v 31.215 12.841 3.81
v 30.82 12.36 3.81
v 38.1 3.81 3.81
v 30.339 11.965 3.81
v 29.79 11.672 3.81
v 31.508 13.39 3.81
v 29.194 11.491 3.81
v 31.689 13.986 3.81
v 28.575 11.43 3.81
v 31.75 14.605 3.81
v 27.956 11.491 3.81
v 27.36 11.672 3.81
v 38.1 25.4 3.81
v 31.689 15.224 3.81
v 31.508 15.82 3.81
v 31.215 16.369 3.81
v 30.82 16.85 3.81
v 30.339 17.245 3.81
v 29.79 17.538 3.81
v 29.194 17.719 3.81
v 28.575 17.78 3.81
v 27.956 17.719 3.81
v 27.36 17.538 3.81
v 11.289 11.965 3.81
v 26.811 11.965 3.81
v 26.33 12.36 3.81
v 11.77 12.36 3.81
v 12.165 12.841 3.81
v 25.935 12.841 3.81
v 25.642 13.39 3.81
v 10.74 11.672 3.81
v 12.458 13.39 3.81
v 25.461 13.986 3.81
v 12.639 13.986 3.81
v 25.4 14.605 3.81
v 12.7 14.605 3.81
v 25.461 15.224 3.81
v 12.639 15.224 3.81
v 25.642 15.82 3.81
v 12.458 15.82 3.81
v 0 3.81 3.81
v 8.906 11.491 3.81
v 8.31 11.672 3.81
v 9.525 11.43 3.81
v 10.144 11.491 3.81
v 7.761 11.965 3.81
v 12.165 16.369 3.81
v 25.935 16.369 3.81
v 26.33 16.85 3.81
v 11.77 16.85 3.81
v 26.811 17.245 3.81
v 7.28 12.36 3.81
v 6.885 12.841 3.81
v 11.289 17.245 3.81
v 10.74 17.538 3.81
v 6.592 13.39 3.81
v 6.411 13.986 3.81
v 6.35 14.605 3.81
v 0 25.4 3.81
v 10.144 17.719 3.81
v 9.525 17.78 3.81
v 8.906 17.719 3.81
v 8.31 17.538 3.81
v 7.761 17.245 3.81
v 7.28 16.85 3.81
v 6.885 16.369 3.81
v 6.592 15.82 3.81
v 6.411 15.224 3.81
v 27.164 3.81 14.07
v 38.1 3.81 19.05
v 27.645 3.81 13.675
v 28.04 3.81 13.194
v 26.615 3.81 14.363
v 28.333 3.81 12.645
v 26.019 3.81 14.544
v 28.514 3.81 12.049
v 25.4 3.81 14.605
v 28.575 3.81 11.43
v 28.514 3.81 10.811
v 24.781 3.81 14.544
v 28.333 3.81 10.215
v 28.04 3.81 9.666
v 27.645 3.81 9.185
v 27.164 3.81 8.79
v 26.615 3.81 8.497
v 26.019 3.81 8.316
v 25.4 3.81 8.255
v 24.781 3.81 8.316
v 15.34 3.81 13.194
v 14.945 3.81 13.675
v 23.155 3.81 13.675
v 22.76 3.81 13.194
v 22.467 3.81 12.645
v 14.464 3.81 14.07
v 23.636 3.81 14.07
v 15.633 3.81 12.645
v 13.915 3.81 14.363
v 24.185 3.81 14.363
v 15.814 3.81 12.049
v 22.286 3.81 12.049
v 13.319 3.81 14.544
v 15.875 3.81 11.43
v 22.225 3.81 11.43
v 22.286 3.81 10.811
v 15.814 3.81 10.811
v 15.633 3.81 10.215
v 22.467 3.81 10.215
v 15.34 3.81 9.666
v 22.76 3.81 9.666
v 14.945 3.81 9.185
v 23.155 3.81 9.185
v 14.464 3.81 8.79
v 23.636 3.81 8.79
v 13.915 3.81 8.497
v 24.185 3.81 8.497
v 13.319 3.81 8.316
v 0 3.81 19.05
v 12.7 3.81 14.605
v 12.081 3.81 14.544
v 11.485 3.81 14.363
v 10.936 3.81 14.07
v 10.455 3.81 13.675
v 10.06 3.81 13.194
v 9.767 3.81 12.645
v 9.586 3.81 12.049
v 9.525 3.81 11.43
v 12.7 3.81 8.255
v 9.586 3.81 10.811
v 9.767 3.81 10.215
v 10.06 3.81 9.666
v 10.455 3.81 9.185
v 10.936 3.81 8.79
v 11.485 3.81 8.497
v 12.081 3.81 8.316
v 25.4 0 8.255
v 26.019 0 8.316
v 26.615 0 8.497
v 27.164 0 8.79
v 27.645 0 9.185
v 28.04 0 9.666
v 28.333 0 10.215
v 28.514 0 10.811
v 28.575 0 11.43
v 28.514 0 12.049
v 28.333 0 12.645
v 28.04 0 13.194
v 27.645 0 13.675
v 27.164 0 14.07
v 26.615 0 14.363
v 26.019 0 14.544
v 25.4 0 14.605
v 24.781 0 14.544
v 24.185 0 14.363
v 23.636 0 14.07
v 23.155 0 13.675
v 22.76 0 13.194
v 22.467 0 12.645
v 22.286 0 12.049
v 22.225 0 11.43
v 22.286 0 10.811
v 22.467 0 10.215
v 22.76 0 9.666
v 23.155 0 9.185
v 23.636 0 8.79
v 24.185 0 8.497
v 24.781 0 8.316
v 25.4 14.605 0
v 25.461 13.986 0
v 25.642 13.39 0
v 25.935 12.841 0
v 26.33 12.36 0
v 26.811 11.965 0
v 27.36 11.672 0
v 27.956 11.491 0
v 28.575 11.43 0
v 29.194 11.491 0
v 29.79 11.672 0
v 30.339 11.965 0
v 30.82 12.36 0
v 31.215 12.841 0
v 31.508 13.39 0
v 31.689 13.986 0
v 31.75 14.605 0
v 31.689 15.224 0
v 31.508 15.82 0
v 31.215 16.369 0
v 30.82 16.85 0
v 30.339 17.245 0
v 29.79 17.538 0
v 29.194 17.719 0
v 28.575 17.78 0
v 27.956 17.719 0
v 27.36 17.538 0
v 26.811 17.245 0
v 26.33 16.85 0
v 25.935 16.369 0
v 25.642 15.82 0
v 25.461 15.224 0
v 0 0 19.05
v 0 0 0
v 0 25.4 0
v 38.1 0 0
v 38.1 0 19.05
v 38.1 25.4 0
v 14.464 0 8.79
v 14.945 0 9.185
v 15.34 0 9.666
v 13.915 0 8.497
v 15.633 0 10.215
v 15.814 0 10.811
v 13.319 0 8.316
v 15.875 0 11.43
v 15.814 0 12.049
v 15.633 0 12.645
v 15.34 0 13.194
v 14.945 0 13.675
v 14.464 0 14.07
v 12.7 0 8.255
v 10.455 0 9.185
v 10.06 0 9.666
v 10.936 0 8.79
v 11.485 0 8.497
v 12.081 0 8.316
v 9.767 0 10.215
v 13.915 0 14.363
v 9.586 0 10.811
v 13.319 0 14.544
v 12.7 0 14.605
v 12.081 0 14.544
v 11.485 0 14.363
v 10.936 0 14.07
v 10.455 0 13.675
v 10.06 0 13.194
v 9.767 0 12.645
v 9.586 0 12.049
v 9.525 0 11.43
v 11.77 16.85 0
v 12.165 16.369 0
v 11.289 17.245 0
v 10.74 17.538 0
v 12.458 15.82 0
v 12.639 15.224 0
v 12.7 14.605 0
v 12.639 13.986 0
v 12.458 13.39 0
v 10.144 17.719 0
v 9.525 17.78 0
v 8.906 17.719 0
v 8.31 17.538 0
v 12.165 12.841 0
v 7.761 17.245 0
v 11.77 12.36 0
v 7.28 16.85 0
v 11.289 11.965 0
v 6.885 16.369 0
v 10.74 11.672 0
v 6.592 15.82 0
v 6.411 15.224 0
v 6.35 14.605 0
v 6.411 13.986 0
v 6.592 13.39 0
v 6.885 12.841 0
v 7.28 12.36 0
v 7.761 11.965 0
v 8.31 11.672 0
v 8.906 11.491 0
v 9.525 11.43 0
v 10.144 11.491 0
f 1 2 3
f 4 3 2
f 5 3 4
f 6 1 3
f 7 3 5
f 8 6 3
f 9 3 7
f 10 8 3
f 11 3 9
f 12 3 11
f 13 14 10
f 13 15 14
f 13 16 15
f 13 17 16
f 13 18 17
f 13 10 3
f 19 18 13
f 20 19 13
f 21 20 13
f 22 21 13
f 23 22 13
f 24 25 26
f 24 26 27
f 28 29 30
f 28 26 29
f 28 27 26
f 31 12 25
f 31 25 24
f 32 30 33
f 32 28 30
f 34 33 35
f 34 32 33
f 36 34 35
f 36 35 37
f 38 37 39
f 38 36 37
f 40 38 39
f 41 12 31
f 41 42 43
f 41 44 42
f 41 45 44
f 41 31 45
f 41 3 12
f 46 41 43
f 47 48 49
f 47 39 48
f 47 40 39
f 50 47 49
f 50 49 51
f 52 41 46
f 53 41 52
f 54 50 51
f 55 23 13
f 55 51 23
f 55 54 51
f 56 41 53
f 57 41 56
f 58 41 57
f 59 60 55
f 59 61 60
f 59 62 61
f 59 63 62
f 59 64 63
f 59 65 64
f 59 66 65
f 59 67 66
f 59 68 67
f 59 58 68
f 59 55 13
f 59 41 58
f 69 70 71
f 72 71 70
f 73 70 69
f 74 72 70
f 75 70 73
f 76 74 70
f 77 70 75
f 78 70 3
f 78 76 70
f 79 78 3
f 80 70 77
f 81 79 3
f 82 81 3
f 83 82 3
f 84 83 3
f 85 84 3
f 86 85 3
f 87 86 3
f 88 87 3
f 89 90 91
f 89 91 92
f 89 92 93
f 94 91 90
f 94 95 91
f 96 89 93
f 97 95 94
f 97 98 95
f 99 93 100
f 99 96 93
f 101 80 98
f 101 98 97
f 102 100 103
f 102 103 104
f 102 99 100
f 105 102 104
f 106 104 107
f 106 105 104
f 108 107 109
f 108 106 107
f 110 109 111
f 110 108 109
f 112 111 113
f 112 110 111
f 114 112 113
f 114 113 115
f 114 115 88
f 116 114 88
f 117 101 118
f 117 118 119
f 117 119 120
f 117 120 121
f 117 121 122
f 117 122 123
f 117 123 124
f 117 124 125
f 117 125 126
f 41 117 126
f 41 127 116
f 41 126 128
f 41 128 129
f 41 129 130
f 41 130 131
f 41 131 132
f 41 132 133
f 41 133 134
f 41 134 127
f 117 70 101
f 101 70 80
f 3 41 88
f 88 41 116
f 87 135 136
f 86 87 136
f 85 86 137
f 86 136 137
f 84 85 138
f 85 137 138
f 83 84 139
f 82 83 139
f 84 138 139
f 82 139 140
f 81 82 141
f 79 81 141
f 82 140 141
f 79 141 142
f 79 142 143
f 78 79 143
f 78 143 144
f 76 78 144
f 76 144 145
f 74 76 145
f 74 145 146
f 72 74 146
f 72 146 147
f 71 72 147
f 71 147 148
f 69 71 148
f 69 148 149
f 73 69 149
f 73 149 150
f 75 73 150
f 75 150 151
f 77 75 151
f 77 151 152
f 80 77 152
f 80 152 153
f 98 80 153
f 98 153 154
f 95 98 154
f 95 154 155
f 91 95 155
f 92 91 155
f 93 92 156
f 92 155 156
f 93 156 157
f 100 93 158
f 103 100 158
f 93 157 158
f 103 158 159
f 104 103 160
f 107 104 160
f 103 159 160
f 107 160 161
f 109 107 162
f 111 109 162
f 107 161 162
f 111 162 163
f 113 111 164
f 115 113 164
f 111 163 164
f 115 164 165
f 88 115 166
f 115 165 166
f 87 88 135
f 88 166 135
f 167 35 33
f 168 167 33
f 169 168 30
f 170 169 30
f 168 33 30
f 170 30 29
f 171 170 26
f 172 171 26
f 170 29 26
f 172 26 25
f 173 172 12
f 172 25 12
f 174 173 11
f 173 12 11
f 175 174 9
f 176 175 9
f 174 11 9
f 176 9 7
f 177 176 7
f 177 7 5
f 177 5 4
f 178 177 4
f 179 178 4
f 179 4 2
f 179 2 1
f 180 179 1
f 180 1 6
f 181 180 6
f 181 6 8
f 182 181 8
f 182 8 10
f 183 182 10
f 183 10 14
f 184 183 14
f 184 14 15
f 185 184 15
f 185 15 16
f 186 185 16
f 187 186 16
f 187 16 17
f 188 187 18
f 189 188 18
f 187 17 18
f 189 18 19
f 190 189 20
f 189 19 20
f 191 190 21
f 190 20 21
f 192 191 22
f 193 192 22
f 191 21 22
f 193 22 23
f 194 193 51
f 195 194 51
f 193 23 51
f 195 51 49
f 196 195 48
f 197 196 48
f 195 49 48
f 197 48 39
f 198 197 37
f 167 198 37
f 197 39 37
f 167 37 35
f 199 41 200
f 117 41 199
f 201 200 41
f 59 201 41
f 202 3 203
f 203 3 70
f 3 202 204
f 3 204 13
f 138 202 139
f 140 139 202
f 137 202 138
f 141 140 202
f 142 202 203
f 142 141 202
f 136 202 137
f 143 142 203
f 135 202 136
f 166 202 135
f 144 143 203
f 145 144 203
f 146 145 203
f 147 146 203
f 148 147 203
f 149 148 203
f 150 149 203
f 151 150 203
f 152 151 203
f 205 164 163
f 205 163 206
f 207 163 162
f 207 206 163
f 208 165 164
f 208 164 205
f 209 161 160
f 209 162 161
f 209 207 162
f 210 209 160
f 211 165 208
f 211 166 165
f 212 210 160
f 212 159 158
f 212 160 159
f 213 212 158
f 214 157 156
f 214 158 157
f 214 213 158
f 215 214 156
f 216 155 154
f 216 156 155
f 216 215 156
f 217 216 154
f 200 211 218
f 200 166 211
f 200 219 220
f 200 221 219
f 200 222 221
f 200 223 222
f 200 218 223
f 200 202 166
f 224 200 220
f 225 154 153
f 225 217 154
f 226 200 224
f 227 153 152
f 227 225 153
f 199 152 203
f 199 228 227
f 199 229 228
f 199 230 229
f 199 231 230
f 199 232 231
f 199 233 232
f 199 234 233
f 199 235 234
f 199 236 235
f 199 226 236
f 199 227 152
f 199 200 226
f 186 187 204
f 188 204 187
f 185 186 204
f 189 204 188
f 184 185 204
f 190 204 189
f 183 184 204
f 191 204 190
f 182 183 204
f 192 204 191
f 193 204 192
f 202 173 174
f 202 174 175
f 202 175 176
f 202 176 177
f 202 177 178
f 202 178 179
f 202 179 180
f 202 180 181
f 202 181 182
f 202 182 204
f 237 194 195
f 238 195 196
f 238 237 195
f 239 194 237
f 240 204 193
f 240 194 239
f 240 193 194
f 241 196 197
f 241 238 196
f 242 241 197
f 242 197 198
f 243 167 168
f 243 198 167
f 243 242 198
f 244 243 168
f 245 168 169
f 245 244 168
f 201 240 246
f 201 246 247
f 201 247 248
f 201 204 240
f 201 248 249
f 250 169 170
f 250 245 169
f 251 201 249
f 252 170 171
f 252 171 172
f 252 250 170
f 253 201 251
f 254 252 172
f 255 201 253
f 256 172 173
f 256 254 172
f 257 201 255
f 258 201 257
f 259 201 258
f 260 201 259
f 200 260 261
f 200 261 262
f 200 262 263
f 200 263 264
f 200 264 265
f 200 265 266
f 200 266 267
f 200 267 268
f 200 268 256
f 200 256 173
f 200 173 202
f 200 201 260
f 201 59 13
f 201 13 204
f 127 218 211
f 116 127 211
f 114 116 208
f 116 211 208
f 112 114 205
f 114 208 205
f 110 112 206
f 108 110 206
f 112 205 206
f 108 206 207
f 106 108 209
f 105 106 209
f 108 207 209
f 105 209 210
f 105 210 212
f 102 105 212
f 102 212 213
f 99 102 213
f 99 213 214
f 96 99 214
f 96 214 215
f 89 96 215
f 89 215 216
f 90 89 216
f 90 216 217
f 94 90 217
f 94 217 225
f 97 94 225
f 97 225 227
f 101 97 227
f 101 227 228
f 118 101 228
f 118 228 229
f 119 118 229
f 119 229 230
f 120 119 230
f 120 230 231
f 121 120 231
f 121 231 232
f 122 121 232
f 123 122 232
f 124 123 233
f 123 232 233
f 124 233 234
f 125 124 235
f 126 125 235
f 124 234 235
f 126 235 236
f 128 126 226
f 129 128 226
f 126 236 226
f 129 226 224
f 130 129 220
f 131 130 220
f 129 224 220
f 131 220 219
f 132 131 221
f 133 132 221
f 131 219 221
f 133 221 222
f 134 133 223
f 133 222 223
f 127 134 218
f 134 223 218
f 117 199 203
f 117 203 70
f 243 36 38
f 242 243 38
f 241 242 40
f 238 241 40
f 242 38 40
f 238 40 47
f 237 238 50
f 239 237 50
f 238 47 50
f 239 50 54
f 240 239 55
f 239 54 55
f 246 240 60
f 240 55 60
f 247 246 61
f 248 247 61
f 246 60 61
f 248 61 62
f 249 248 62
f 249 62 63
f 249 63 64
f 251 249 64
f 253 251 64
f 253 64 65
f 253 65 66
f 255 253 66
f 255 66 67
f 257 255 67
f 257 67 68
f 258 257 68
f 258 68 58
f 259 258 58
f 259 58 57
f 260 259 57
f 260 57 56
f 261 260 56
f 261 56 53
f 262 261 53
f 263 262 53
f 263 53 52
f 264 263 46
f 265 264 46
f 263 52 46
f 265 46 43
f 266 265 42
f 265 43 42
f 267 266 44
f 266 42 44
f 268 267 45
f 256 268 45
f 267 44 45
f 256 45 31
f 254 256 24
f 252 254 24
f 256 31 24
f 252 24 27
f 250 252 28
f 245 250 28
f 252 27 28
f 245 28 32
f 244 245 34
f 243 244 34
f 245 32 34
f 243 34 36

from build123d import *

# Parameters (mm, degrees)
BOSS_EXTRUDE1_DEPTH = 38.1
SKETCH3_R           = 3.175
CUT_EXTRUDE1_DEPTH  = 49.26
SKETCH4_R           = 3.175
CUT_EXTRUDE2_DEPTH  = 25.4


with BuildPart() as part:
    # Sketch2 → Boss-Extrude1 (new body)
    with BuildSketch(Plane(origin=(0, 0, 0), x_dir=(0, 0, -1), z_dir=(1, 0, 0))):
        Polygon((0, 0), (-19.05, 0), (-19.05, 3.81), (-3.81, 3.81), (-3.81, 25.4), (0, 25.4), align=None)
    extrude(amount=BOSS_EXTRUDE1_DEPTH)

    # Sketch3 → Cut-Extrude1 (cut, through all)
    with BuildSketch(Plane.XY.offset(3.81)):
        with Locations((9.525, 14.605)):
            Circle(SKETCH3_R)
        with Locations(Location((28.575, 14.605, 0), (0, 0, 180))):
            Circle(SKETCH3_R)
    extrude(amount=-CUT_EXTRUDE1_DEPTH, mode=Mode.SUBTRACT)

    # Sketch4 → Cut-Extrude2 (cut)
    with BuildSketch(Plane(origin=(0, 0, 0), x_dir=(-1, 0, 0), z_dir=(0, -1, 0))):
        with Locations(Location((-12.7, -11.43, 0), (0, 0, 90))):
            Circle(SKETCH4_R)
        with Locations(Location((-25.4, -11.43, 0), (0, 0, 90))):
            Circle(SKETCH4_R)
    extrude(amount=-CUT_EXTRUDE2_DEPTH, mode=Mode.SUBTRACT)


solid = part.part
